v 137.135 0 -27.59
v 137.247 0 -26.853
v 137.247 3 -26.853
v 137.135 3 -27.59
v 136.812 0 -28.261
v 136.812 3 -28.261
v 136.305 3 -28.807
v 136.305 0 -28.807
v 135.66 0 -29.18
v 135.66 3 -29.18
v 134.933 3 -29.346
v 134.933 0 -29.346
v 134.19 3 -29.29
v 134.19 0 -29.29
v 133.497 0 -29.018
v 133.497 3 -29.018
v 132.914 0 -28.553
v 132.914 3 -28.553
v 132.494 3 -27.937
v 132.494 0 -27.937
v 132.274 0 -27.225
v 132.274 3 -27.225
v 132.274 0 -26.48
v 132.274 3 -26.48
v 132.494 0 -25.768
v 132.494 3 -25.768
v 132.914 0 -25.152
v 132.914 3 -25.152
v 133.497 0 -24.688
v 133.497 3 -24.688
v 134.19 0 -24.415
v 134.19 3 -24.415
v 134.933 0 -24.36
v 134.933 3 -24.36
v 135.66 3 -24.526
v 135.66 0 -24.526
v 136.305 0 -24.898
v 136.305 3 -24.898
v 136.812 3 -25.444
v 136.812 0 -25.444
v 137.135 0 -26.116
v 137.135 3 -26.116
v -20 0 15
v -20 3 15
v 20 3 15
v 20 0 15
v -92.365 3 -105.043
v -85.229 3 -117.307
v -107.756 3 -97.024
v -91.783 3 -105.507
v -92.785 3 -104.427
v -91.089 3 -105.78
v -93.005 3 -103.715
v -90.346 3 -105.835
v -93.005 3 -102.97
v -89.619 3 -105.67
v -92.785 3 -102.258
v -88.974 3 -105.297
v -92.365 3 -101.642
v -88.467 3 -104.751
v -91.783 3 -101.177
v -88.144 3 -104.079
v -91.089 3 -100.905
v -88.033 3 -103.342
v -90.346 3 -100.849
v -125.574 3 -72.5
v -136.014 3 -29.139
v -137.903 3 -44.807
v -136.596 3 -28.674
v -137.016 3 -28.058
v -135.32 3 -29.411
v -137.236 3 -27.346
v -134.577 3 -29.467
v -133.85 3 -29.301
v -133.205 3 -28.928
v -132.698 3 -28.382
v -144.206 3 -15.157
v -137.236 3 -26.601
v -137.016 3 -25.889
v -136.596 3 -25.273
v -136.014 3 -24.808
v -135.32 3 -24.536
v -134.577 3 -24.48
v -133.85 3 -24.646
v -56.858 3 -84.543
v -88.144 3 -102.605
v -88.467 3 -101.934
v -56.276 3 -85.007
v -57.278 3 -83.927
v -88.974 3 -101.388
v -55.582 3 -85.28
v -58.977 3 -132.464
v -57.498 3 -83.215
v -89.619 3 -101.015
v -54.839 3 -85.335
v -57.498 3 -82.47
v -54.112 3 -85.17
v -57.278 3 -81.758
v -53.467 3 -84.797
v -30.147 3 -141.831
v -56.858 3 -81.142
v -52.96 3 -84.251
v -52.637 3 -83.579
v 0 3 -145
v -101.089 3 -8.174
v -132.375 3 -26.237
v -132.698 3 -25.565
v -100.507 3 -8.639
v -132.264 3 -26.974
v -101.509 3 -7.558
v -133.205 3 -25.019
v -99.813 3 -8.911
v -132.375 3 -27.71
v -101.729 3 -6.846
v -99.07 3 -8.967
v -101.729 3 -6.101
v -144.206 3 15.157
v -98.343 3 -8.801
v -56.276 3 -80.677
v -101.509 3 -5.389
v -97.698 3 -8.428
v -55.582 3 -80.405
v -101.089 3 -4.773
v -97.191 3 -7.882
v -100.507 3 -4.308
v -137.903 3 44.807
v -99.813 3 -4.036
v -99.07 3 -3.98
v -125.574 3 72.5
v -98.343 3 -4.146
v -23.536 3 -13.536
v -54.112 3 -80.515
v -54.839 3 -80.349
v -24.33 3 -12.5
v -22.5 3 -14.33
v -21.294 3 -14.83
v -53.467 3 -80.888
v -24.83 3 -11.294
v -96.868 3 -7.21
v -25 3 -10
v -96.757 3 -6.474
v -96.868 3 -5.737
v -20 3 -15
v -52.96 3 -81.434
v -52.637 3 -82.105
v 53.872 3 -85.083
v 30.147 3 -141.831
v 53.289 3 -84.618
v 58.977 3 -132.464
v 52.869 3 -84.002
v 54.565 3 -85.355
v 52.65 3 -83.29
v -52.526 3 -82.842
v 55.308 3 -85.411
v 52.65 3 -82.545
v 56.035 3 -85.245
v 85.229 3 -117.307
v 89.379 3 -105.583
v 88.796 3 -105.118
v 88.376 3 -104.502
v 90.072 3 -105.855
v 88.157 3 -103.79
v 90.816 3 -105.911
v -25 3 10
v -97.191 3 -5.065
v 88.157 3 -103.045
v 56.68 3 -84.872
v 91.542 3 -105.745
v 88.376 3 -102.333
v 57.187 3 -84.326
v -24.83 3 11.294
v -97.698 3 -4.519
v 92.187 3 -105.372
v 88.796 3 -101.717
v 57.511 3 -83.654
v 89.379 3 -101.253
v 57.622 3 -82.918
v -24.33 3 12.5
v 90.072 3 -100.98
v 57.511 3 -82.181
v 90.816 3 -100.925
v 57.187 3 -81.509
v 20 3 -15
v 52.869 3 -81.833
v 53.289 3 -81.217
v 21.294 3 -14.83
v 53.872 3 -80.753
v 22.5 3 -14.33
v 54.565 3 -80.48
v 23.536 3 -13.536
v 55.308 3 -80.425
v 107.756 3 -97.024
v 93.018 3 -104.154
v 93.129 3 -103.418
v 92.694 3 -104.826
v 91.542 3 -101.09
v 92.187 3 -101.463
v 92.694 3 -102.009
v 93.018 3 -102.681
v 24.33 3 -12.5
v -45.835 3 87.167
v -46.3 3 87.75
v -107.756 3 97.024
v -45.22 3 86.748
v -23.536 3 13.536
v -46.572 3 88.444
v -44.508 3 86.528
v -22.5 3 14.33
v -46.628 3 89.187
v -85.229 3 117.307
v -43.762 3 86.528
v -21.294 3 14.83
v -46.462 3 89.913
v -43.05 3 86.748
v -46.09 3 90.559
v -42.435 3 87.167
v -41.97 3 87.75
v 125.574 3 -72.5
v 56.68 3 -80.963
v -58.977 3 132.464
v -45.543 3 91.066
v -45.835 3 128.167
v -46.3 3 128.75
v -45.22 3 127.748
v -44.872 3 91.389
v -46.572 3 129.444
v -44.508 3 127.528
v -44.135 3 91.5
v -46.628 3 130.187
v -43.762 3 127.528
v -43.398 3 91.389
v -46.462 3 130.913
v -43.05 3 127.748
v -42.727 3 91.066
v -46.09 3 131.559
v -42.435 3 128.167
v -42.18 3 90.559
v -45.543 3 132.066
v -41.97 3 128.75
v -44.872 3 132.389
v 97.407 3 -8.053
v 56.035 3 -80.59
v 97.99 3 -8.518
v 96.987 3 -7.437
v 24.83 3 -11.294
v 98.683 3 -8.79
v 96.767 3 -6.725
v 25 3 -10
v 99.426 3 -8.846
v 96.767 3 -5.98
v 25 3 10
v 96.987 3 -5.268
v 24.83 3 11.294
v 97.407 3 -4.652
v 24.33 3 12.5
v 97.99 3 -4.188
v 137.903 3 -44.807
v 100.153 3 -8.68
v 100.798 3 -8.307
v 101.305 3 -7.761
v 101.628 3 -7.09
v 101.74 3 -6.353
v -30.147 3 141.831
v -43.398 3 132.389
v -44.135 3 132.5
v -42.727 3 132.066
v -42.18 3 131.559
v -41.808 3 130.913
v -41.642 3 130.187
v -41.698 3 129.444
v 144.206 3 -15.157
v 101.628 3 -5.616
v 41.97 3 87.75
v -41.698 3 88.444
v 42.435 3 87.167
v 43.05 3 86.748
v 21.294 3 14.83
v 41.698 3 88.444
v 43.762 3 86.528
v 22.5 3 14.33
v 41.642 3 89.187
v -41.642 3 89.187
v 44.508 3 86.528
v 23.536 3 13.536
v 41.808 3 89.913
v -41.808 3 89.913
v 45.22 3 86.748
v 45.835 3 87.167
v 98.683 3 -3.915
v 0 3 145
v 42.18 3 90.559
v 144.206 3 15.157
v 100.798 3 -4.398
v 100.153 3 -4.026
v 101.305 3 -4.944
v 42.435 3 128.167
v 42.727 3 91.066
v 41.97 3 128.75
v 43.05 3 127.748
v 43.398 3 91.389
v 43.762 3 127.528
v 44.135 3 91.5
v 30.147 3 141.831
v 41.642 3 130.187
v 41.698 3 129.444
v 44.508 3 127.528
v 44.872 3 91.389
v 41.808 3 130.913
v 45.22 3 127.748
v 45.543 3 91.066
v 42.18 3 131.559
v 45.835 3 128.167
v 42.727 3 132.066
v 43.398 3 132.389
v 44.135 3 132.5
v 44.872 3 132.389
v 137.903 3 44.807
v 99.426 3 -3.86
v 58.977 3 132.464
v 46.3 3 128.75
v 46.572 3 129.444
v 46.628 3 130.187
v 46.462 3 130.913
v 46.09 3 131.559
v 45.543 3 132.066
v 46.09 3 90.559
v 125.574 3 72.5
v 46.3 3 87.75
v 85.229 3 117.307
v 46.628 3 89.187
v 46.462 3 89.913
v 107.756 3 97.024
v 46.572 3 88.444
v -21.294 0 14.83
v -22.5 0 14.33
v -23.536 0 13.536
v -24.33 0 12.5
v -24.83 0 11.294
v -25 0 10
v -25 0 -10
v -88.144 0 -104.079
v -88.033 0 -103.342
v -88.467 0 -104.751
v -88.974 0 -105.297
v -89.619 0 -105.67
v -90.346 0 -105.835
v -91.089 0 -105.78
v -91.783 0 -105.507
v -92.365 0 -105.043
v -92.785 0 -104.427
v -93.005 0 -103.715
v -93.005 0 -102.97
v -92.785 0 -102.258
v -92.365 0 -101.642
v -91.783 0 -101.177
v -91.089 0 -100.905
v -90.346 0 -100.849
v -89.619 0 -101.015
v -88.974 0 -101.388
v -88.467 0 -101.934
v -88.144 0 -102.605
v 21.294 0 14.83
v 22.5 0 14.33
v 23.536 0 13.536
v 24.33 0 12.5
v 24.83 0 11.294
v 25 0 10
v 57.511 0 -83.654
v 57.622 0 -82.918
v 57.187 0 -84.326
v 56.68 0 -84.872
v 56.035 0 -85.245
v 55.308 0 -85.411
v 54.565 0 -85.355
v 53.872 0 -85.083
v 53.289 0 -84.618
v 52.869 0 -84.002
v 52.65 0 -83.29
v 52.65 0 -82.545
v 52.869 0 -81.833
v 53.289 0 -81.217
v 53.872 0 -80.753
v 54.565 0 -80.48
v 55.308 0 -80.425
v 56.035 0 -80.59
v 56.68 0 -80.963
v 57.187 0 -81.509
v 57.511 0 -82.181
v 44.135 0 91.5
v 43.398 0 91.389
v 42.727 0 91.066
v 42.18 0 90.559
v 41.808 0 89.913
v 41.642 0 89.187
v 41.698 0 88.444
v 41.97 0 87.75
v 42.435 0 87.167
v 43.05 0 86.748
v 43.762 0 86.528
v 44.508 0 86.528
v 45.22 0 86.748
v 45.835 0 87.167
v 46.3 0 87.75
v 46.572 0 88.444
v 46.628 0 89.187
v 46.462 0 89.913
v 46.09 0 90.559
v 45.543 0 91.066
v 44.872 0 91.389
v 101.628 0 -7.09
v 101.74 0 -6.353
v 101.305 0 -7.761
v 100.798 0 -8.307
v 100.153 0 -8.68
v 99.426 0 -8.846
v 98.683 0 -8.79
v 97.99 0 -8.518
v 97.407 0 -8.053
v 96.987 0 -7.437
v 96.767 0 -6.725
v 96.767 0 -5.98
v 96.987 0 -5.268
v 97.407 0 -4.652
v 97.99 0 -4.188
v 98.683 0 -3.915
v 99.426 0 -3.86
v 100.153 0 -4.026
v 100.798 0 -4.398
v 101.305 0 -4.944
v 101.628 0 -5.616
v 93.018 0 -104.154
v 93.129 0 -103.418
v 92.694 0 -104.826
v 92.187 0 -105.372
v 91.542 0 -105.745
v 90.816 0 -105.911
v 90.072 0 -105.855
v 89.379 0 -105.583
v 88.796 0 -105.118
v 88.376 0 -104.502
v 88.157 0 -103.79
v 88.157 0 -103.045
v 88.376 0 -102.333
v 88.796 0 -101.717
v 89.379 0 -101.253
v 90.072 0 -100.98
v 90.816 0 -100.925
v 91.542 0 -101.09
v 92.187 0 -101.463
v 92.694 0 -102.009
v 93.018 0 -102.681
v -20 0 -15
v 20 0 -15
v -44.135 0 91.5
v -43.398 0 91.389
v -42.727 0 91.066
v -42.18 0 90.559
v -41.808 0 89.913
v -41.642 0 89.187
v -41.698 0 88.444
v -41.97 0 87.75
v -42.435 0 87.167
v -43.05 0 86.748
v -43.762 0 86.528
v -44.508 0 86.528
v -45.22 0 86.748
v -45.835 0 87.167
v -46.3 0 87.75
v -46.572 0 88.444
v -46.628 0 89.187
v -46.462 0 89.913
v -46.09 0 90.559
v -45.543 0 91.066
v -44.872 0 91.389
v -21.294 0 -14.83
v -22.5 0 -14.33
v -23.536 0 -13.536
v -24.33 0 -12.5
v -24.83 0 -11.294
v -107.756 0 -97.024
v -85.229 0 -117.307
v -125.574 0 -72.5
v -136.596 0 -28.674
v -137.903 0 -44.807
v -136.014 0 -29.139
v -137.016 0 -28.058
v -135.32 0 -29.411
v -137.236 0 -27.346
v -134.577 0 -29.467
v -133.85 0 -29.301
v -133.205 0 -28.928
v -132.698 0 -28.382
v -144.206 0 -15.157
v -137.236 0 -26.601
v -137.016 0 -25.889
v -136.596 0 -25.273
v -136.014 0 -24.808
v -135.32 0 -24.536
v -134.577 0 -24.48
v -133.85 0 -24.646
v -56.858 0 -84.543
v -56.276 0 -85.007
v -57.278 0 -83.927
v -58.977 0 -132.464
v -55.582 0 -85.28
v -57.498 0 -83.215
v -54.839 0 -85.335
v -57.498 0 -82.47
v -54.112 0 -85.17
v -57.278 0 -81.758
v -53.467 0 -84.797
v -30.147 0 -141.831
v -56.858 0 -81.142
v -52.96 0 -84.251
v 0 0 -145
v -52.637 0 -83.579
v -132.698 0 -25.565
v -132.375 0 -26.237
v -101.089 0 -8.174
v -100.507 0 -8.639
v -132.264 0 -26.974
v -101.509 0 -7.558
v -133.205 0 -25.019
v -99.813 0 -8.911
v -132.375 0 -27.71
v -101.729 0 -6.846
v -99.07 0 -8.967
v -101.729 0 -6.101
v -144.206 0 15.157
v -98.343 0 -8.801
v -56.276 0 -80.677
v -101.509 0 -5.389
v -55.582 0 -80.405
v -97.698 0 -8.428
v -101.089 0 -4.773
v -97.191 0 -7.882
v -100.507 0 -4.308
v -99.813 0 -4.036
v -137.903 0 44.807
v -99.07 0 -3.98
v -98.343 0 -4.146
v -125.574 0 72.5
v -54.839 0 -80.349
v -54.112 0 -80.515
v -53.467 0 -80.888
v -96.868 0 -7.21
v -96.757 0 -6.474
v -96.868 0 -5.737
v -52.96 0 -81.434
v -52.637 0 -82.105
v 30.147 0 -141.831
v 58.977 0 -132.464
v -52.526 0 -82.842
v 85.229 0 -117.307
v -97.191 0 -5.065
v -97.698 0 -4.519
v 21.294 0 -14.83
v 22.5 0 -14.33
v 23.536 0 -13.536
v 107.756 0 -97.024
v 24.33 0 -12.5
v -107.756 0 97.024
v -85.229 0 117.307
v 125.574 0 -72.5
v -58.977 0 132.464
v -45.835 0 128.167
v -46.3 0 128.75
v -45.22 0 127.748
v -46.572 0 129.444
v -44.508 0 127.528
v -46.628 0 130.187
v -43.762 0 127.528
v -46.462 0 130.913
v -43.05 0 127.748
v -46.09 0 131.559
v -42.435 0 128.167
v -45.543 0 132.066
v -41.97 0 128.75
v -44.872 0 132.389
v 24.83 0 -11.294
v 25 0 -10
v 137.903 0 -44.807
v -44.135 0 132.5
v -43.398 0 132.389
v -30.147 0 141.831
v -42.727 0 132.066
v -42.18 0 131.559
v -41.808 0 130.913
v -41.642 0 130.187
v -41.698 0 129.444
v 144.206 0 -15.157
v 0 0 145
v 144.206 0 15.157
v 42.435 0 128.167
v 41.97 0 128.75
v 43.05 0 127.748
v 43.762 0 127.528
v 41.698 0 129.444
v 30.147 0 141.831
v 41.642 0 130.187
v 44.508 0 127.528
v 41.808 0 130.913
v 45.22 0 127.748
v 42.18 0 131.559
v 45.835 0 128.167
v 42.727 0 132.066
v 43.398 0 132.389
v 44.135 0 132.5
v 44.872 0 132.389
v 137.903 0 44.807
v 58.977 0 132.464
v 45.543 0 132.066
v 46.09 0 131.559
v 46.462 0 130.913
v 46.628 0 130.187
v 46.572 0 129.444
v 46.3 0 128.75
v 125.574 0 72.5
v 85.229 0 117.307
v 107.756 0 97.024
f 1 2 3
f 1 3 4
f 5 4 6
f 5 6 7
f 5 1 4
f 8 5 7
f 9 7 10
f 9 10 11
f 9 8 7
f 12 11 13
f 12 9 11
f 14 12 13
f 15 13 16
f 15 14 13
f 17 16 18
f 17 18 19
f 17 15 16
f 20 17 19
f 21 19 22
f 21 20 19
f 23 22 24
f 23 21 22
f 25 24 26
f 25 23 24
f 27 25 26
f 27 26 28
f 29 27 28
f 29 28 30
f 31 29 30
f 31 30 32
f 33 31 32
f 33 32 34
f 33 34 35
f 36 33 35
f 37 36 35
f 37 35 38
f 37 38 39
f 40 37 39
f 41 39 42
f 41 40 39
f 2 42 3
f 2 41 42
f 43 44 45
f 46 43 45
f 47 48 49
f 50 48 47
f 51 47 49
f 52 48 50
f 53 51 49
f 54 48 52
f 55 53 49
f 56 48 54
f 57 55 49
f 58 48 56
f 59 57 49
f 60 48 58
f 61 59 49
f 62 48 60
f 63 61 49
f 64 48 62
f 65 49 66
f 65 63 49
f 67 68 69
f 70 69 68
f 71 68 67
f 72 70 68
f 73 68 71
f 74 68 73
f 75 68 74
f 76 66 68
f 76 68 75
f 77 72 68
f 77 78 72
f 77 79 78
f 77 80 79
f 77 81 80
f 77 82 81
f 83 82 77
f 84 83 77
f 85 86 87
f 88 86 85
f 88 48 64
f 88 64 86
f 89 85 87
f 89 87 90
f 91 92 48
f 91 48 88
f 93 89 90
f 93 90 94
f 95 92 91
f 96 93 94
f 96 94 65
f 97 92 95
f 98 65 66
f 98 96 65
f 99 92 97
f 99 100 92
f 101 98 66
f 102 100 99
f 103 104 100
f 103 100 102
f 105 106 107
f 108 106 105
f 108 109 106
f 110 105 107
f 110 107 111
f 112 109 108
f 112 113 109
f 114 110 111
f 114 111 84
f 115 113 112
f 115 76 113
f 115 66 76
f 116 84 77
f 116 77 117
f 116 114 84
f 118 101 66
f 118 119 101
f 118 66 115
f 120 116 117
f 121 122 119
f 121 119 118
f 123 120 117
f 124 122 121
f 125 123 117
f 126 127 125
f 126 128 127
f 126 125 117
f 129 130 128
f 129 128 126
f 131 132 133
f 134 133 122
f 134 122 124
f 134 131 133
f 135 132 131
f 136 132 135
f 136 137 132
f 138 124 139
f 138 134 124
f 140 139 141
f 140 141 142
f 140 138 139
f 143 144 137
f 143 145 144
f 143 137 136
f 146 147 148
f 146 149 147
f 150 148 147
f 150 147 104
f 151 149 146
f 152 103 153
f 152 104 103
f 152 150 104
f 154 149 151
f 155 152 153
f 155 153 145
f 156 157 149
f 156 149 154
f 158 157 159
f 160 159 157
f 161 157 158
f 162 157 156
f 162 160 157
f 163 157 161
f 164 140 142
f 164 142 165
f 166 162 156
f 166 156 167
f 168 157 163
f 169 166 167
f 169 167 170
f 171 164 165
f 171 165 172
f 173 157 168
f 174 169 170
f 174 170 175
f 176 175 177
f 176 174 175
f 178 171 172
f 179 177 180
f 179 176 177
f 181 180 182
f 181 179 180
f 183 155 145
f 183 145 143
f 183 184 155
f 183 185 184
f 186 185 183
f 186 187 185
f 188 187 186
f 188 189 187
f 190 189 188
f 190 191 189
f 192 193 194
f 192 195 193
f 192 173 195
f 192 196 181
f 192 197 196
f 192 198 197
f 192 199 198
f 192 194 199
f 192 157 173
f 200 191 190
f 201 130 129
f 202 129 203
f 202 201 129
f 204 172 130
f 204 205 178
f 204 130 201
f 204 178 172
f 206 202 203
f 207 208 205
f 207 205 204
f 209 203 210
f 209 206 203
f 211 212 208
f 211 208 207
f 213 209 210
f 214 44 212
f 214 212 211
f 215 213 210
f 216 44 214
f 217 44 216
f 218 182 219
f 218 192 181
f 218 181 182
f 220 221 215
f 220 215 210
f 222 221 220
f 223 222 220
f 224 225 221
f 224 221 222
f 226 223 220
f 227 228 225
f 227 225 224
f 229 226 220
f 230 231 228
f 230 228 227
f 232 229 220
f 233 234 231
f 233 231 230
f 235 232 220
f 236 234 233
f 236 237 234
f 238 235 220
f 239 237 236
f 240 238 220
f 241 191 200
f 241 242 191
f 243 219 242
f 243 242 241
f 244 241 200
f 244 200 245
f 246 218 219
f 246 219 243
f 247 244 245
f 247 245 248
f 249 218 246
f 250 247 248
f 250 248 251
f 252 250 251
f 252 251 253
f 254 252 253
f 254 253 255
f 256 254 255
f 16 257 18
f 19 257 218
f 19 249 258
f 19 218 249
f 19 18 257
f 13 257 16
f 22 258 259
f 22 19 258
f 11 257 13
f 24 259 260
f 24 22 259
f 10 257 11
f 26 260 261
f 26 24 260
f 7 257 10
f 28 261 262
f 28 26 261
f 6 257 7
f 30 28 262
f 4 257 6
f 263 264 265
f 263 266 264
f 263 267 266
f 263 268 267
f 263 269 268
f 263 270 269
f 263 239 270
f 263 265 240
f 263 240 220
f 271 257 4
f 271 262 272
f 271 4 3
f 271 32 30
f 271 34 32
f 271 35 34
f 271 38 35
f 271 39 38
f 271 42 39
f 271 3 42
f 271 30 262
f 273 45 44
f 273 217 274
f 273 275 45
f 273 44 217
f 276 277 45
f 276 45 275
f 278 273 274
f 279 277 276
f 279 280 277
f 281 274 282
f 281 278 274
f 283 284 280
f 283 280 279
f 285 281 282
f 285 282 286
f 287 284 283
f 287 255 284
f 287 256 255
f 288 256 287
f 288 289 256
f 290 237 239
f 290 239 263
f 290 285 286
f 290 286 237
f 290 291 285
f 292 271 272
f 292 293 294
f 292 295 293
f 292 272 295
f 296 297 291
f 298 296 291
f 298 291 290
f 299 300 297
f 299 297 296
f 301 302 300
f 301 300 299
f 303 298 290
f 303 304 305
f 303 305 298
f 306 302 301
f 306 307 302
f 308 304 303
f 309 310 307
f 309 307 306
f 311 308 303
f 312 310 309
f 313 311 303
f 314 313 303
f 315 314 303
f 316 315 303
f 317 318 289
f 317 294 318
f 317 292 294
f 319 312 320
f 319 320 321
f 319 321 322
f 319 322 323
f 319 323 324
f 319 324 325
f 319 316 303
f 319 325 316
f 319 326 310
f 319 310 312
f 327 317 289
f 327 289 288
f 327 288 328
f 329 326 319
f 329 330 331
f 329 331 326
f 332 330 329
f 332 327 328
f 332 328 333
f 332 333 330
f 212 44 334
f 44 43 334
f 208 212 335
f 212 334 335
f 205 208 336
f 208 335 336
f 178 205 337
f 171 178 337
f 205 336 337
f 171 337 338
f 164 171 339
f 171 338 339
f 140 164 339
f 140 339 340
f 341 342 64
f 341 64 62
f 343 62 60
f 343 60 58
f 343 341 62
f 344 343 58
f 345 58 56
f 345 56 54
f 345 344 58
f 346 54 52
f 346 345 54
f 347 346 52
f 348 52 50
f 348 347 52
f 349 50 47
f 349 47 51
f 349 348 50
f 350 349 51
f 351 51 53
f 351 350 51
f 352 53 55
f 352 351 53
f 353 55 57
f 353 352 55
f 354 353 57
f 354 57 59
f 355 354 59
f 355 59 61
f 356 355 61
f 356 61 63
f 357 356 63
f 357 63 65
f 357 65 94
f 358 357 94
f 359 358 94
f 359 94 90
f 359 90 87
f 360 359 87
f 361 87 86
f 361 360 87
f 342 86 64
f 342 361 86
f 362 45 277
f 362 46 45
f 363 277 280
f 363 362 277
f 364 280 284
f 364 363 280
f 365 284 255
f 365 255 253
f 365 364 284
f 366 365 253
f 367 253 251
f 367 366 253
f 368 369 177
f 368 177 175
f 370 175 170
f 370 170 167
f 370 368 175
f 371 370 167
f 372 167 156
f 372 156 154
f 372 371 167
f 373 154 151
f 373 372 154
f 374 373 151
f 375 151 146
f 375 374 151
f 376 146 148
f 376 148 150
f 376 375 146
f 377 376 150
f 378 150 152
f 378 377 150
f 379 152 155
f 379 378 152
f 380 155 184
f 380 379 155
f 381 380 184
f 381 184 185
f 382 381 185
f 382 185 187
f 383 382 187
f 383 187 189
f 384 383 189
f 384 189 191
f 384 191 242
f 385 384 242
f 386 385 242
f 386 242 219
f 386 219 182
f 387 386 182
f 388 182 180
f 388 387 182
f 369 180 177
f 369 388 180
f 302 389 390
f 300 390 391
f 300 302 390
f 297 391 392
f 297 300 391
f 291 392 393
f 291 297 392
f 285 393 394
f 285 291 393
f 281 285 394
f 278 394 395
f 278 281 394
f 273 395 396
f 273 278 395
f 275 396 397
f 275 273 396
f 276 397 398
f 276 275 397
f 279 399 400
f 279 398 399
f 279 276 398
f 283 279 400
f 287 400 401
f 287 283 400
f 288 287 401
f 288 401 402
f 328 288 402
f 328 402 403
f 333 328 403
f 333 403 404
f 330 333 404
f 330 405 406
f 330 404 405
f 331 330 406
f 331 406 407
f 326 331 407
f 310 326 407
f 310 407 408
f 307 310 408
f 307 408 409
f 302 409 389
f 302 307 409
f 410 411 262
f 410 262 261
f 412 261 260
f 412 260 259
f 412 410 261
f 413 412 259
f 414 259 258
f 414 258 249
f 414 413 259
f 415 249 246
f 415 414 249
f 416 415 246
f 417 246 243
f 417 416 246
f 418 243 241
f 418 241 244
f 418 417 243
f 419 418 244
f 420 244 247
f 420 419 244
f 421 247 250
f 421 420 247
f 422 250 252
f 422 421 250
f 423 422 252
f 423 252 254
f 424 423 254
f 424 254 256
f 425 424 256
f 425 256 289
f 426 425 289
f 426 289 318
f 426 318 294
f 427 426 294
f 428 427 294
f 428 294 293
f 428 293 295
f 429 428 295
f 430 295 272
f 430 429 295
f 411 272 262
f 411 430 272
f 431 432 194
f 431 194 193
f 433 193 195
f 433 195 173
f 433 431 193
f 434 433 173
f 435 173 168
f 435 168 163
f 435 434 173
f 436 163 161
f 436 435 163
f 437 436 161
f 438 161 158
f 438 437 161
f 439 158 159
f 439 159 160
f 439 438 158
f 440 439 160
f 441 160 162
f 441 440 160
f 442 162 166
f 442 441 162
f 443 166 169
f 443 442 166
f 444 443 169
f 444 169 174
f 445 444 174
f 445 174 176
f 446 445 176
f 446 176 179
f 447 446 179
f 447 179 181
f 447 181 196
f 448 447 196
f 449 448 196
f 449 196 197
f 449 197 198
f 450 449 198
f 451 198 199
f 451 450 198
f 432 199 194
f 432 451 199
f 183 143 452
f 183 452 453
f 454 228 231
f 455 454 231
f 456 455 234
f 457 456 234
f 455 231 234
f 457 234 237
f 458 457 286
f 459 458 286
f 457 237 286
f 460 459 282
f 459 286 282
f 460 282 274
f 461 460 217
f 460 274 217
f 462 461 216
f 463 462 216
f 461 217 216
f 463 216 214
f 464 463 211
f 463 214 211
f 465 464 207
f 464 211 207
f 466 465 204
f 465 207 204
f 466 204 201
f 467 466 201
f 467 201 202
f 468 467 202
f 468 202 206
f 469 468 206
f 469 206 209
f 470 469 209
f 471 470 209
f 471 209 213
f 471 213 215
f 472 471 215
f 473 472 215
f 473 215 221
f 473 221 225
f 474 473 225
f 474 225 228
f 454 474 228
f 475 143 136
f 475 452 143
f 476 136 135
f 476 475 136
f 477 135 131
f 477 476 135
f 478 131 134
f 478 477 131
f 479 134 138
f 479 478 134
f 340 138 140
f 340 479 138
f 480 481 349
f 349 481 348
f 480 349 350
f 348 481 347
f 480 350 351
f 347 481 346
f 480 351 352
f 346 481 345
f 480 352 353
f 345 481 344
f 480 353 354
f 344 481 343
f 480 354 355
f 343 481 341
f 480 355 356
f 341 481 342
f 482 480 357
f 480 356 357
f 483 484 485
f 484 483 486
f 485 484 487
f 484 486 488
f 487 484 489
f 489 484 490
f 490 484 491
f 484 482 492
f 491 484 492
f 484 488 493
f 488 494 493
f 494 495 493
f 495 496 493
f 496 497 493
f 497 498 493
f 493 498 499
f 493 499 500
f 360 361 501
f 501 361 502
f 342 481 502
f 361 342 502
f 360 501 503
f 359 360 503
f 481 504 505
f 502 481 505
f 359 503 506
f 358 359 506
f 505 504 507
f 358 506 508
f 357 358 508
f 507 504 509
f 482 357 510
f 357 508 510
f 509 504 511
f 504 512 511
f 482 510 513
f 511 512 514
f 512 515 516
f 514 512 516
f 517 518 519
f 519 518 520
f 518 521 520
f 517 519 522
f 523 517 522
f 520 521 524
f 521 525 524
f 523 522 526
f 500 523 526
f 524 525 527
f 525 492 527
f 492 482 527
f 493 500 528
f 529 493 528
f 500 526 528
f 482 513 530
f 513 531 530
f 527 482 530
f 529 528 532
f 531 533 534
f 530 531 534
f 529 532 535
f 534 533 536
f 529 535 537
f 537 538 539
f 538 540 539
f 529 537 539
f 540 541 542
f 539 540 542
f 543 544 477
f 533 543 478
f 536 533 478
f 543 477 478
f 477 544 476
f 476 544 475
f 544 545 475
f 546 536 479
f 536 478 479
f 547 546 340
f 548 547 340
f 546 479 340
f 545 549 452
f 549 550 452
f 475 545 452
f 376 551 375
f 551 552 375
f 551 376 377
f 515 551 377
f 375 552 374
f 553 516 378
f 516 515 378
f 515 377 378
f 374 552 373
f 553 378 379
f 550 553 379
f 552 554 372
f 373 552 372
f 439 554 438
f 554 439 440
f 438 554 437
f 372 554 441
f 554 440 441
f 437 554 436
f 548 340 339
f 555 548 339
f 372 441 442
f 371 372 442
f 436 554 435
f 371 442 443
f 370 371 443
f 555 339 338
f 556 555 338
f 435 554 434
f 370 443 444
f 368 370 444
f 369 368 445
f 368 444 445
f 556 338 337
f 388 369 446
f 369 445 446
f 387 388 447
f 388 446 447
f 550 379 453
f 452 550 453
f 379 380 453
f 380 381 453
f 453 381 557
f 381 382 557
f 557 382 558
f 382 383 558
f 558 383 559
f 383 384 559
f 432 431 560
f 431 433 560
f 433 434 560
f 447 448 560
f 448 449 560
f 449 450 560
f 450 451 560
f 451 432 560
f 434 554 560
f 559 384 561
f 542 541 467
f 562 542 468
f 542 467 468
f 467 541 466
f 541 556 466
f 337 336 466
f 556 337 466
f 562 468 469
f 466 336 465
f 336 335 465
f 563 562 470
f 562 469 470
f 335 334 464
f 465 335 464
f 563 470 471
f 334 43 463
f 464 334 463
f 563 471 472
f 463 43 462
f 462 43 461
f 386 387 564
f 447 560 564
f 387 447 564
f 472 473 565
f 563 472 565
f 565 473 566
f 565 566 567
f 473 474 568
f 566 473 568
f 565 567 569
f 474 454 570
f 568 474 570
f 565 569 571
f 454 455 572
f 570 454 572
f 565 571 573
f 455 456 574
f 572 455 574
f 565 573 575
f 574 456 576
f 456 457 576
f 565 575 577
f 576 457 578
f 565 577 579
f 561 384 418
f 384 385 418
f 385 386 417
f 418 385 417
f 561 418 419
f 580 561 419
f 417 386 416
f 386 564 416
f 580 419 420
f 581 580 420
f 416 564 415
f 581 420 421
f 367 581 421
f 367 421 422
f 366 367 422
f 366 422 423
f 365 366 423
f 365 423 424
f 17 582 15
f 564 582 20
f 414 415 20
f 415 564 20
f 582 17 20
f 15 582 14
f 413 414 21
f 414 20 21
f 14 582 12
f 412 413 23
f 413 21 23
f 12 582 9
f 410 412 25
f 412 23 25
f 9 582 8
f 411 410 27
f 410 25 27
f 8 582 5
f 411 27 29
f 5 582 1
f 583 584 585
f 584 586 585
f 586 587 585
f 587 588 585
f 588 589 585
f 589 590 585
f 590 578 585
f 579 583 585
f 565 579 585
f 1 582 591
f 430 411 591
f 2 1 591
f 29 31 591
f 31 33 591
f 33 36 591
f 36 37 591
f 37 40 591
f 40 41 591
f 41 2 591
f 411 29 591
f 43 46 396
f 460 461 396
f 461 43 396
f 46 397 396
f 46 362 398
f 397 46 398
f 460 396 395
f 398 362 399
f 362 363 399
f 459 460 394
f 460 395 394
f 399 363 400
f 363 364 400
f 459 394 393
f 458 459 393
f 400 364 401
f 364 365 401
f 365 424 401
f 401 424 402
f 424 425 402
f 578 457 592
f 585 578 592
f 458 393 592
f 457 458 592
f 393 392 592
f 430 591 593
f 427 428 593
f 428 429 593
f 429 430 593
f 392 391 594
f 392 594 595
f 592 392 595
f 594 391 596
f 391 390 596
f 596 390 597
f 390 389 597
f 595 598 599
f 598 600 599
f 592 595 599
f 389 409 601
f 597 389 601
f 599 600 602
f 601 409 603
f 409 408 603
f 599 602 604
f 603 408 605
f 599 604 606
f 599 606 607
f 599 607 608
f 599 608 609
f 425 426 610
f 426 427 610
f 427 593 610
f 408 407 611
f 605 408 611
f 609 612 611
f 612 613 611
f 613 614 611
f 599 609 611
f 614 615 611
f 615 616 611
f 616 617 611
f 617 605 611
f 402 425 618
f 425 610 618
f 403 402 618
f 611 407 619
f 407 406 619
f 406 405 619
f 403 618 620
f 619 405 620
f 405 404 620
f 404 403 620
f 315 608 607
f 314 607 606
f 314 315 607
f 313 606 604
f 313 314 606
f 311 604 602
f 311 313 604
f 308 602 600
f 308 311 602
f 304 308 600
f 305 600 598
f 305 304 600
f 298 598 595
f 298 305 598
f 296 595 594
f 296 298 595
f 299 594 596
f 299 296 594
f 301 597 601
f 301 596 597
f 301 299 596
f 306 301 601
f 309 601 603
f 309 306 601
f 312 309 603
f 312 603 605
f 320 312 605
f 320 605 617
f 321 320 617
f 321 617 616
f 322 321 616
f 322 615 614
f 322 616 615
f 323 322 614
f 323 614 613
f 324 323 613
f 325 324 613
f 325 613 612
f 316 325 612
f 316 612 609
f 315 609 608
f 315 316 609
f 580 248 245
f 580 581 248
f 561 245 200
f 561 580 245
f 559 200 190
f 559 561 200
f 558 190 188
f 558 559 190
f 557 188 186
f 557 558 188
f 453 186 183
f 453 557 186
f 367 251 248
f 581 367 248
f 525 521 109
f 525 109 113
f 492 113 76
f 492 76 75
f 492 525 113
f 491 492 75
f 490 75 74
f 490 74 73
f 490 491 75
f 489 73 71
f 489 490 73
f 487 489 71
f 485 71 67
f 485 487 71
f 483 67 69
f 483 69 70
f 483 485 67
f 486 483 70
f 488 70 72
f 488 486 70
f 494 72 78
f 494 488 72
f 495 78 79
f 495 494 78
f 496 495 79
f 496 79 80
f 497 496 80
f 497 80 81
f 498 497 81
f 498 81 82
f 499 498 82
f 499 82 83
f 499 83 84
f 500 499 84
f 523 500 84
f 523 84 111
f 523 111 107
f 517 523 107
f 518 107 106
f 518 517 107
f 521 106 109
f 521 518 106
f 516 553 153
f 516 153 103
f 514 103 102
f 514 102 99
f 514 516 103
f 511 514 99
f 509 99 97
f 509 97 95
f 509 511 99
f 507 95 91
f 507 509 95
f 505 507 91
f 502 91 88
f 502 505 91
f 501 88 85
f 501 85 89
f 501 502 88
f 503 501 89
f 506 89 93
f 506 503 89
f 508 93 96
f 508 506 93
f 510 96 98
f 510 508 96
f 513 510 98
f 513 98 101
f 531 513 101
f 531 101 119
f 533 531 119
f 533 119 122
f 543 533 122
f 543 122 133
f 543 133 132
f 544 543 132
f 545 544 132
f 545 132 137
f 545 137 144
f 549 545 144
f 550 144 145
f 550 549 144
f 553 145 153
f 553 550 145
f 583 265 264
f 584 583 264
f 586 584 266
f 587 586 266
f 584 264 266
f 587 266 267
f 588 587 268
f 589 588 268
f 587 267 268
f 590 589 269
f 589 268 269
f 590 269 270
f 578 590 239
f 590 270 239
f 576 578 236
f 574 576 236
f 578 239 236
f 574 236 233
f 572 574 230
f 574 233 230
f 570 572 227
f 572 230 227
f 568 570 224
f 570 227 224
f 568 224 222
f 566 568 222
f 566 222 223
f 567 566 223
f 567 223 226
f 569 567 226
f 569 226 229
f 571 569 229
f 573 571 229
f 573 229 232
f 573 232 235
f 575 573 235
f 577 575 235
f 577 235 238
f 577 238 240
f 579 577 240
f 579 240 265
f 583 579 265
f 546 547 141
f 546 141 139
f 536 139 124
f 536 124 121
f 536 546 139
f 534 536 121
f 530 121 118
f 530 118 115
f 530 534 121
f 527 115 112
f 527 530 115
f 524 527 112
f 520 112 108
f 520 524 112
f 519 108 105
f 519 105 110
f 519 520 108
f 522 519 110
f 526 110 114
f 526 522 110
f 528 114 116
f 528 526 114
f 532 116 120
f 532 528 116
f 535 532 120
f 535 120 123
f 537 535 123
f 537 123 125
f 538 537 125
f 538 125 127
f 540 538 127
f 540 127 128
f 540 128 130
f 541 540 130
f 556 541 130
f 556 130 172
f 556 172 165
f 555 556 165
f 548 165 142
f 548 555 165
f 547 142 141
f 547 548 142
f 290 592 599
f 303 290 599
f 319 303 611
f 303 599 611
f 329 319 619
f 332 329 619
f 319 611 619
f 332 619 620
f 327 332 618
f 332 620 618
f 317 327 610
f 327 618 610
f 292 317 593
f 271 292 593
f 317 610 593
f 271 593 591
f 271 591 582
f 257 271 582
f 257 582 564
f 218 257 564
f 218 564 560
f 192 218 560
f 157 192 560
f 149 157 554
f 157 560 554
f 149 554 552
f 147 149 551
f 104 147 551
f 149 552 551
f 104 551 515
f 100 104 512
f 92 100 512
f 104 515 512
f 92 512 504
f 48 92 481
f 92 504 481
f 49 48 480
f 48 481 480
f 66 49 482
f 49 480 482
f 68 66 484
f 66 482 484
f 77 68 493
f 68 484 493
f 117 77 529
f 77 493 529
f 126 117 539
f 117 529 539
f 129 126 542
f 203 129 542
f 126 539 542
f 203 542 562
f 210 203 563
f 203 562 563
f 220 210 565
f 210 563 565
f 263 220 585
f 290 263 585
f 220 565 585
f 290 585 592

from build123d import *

# Parameters (mm, degrees)
SKETCH_1_R                   = 145
EXTRUDE_1_DEPTH              = 3
SKETCH_2_R                   = 2.5
CUT_EXTRUDE_1_DEPTH          = 10
PATTERN_CIRCULAR_1_OUTLINE_R = 2.5
PATTERN_CIRCULAR_1_DEPTH     = 3
SKETCH_5_W                   = 50
SKETCH_5_H                   = 30
CUT_EXTRUDE_2_DEPTH          = 10
FILLET_1_R                   = 5


# Read off the part's stored shape, not the designer's step: 阵列(圆周)1
with BuildPart() as part:
    # 草图1 → 凸台-拉伸1 (new body)
    with BuildSketch(Plane(origin=(0, 0, 0), x_dir=(1, 0, 0), z_dir=(0, 1, 0))):
        with Locations(Location((0, 0, 0), (0, 0, 270))):
            Circle(SKETCH_1_R)
    extrude(amount=EXTRUDE_1_DEPTH)

    # 草图2 → 切除-拉伸1 (cut)
    with BuildSketch(Plane(origin=(0, 3, 0), x_dir=(1, 0, 0), z_dir=(0, 1, 0))):
        with Locations(Location((-44.135, -89, 0), (0, 0, 270))):
            Circle(SKETCH_2_R)
        with Locations(Location((-44.135, -130, 0), (0, 0, 270))):
            Circle(SKETCH_2_R)
    cut_extrude_1 = extrude(amount=-CUT_EXTRUDE_1_DEPTH, mode=Mode.SUBTRACT)

    # 镜向1: 切除-拉伸1 across plane
    add(cut_extrude_1.mirror(Plane(origin=(0, 0, 0), x_dir=(0, 0, 1), z_dir=(1, 0, 0))), mode=Mode.SUBTRACT)

    # 阵列(圆周)1 outline → 阵列(圆周)1 (cut)
    with BuildSketch(Plane(origin=(0, 0, 0), x_dir=(1, 0, 0), z_dir=(0, 1, 0))):
        with Locations((55.121653534, 82.91756691)):
            Circle(PATTERN_CIRCULAR_1_OUTLINE_R)
        with Locations((90.628695089, 103.41756691)):
            Circle(PATTERN_CIRCULAR_1_OUTLINE_R)
        with Locations((-99.256653534, 6.473504518)):
            Circle(PATTERN_CIRCULAR_1_OUTLINE_R)
        with Locations((-134.763695089, 26.973504518)):
            Circle(PATTERN_CIRCULAR_1_OUTLINE_R)
        with Locations((99.239525897, 6.352725277)):
            Circle(PATTERN_CIRCULAR_1_OUTLINE_R)
        with Locations((-90.532661016, 103.342344321)):
            Circle(PATTERN_CIRCULAR_1_OUTLINE_R)
        with Locations((-55.025619461, 82.842344321)):
            Circle(PATTERN_CIRCULAR_1_OUTLINE_R)
        with Locations((134.746567453, 26.852725277)):
            Circle(PATTERN_CIRCULAR_1_OUTLINE_R)
    extrude(amount=PATTERN_CIRCULAR_1_DEPTH, mode=Mode.SUBTRACT)

    # 草图5 → 切除-拉伸2 (cut)
    with BuildSketch(Plane(origin=(0, 3, 0), x_dir=(1, 0, 0), z_dir=(0, 1, 0))):
        Rectangle(SKETCH_5_W, SKETCH_5_H)
    extrude(amount=-CUT_EXTRUDE_2_DEPTH, mode=Mode.SUBTRACT)

    # 圆角1
    fillet_1_edges = [part.edges().sort_by_distance(p)[0] for p in [
        (25, 1.5, -15),
        (25, 1.5, 15),
        (-25, 1.5, 15),
        (-25, 1.5, -15),
    ]]
    fillet(fillet_1_edges, radius=FILLET_1_R)


solid = part.part
